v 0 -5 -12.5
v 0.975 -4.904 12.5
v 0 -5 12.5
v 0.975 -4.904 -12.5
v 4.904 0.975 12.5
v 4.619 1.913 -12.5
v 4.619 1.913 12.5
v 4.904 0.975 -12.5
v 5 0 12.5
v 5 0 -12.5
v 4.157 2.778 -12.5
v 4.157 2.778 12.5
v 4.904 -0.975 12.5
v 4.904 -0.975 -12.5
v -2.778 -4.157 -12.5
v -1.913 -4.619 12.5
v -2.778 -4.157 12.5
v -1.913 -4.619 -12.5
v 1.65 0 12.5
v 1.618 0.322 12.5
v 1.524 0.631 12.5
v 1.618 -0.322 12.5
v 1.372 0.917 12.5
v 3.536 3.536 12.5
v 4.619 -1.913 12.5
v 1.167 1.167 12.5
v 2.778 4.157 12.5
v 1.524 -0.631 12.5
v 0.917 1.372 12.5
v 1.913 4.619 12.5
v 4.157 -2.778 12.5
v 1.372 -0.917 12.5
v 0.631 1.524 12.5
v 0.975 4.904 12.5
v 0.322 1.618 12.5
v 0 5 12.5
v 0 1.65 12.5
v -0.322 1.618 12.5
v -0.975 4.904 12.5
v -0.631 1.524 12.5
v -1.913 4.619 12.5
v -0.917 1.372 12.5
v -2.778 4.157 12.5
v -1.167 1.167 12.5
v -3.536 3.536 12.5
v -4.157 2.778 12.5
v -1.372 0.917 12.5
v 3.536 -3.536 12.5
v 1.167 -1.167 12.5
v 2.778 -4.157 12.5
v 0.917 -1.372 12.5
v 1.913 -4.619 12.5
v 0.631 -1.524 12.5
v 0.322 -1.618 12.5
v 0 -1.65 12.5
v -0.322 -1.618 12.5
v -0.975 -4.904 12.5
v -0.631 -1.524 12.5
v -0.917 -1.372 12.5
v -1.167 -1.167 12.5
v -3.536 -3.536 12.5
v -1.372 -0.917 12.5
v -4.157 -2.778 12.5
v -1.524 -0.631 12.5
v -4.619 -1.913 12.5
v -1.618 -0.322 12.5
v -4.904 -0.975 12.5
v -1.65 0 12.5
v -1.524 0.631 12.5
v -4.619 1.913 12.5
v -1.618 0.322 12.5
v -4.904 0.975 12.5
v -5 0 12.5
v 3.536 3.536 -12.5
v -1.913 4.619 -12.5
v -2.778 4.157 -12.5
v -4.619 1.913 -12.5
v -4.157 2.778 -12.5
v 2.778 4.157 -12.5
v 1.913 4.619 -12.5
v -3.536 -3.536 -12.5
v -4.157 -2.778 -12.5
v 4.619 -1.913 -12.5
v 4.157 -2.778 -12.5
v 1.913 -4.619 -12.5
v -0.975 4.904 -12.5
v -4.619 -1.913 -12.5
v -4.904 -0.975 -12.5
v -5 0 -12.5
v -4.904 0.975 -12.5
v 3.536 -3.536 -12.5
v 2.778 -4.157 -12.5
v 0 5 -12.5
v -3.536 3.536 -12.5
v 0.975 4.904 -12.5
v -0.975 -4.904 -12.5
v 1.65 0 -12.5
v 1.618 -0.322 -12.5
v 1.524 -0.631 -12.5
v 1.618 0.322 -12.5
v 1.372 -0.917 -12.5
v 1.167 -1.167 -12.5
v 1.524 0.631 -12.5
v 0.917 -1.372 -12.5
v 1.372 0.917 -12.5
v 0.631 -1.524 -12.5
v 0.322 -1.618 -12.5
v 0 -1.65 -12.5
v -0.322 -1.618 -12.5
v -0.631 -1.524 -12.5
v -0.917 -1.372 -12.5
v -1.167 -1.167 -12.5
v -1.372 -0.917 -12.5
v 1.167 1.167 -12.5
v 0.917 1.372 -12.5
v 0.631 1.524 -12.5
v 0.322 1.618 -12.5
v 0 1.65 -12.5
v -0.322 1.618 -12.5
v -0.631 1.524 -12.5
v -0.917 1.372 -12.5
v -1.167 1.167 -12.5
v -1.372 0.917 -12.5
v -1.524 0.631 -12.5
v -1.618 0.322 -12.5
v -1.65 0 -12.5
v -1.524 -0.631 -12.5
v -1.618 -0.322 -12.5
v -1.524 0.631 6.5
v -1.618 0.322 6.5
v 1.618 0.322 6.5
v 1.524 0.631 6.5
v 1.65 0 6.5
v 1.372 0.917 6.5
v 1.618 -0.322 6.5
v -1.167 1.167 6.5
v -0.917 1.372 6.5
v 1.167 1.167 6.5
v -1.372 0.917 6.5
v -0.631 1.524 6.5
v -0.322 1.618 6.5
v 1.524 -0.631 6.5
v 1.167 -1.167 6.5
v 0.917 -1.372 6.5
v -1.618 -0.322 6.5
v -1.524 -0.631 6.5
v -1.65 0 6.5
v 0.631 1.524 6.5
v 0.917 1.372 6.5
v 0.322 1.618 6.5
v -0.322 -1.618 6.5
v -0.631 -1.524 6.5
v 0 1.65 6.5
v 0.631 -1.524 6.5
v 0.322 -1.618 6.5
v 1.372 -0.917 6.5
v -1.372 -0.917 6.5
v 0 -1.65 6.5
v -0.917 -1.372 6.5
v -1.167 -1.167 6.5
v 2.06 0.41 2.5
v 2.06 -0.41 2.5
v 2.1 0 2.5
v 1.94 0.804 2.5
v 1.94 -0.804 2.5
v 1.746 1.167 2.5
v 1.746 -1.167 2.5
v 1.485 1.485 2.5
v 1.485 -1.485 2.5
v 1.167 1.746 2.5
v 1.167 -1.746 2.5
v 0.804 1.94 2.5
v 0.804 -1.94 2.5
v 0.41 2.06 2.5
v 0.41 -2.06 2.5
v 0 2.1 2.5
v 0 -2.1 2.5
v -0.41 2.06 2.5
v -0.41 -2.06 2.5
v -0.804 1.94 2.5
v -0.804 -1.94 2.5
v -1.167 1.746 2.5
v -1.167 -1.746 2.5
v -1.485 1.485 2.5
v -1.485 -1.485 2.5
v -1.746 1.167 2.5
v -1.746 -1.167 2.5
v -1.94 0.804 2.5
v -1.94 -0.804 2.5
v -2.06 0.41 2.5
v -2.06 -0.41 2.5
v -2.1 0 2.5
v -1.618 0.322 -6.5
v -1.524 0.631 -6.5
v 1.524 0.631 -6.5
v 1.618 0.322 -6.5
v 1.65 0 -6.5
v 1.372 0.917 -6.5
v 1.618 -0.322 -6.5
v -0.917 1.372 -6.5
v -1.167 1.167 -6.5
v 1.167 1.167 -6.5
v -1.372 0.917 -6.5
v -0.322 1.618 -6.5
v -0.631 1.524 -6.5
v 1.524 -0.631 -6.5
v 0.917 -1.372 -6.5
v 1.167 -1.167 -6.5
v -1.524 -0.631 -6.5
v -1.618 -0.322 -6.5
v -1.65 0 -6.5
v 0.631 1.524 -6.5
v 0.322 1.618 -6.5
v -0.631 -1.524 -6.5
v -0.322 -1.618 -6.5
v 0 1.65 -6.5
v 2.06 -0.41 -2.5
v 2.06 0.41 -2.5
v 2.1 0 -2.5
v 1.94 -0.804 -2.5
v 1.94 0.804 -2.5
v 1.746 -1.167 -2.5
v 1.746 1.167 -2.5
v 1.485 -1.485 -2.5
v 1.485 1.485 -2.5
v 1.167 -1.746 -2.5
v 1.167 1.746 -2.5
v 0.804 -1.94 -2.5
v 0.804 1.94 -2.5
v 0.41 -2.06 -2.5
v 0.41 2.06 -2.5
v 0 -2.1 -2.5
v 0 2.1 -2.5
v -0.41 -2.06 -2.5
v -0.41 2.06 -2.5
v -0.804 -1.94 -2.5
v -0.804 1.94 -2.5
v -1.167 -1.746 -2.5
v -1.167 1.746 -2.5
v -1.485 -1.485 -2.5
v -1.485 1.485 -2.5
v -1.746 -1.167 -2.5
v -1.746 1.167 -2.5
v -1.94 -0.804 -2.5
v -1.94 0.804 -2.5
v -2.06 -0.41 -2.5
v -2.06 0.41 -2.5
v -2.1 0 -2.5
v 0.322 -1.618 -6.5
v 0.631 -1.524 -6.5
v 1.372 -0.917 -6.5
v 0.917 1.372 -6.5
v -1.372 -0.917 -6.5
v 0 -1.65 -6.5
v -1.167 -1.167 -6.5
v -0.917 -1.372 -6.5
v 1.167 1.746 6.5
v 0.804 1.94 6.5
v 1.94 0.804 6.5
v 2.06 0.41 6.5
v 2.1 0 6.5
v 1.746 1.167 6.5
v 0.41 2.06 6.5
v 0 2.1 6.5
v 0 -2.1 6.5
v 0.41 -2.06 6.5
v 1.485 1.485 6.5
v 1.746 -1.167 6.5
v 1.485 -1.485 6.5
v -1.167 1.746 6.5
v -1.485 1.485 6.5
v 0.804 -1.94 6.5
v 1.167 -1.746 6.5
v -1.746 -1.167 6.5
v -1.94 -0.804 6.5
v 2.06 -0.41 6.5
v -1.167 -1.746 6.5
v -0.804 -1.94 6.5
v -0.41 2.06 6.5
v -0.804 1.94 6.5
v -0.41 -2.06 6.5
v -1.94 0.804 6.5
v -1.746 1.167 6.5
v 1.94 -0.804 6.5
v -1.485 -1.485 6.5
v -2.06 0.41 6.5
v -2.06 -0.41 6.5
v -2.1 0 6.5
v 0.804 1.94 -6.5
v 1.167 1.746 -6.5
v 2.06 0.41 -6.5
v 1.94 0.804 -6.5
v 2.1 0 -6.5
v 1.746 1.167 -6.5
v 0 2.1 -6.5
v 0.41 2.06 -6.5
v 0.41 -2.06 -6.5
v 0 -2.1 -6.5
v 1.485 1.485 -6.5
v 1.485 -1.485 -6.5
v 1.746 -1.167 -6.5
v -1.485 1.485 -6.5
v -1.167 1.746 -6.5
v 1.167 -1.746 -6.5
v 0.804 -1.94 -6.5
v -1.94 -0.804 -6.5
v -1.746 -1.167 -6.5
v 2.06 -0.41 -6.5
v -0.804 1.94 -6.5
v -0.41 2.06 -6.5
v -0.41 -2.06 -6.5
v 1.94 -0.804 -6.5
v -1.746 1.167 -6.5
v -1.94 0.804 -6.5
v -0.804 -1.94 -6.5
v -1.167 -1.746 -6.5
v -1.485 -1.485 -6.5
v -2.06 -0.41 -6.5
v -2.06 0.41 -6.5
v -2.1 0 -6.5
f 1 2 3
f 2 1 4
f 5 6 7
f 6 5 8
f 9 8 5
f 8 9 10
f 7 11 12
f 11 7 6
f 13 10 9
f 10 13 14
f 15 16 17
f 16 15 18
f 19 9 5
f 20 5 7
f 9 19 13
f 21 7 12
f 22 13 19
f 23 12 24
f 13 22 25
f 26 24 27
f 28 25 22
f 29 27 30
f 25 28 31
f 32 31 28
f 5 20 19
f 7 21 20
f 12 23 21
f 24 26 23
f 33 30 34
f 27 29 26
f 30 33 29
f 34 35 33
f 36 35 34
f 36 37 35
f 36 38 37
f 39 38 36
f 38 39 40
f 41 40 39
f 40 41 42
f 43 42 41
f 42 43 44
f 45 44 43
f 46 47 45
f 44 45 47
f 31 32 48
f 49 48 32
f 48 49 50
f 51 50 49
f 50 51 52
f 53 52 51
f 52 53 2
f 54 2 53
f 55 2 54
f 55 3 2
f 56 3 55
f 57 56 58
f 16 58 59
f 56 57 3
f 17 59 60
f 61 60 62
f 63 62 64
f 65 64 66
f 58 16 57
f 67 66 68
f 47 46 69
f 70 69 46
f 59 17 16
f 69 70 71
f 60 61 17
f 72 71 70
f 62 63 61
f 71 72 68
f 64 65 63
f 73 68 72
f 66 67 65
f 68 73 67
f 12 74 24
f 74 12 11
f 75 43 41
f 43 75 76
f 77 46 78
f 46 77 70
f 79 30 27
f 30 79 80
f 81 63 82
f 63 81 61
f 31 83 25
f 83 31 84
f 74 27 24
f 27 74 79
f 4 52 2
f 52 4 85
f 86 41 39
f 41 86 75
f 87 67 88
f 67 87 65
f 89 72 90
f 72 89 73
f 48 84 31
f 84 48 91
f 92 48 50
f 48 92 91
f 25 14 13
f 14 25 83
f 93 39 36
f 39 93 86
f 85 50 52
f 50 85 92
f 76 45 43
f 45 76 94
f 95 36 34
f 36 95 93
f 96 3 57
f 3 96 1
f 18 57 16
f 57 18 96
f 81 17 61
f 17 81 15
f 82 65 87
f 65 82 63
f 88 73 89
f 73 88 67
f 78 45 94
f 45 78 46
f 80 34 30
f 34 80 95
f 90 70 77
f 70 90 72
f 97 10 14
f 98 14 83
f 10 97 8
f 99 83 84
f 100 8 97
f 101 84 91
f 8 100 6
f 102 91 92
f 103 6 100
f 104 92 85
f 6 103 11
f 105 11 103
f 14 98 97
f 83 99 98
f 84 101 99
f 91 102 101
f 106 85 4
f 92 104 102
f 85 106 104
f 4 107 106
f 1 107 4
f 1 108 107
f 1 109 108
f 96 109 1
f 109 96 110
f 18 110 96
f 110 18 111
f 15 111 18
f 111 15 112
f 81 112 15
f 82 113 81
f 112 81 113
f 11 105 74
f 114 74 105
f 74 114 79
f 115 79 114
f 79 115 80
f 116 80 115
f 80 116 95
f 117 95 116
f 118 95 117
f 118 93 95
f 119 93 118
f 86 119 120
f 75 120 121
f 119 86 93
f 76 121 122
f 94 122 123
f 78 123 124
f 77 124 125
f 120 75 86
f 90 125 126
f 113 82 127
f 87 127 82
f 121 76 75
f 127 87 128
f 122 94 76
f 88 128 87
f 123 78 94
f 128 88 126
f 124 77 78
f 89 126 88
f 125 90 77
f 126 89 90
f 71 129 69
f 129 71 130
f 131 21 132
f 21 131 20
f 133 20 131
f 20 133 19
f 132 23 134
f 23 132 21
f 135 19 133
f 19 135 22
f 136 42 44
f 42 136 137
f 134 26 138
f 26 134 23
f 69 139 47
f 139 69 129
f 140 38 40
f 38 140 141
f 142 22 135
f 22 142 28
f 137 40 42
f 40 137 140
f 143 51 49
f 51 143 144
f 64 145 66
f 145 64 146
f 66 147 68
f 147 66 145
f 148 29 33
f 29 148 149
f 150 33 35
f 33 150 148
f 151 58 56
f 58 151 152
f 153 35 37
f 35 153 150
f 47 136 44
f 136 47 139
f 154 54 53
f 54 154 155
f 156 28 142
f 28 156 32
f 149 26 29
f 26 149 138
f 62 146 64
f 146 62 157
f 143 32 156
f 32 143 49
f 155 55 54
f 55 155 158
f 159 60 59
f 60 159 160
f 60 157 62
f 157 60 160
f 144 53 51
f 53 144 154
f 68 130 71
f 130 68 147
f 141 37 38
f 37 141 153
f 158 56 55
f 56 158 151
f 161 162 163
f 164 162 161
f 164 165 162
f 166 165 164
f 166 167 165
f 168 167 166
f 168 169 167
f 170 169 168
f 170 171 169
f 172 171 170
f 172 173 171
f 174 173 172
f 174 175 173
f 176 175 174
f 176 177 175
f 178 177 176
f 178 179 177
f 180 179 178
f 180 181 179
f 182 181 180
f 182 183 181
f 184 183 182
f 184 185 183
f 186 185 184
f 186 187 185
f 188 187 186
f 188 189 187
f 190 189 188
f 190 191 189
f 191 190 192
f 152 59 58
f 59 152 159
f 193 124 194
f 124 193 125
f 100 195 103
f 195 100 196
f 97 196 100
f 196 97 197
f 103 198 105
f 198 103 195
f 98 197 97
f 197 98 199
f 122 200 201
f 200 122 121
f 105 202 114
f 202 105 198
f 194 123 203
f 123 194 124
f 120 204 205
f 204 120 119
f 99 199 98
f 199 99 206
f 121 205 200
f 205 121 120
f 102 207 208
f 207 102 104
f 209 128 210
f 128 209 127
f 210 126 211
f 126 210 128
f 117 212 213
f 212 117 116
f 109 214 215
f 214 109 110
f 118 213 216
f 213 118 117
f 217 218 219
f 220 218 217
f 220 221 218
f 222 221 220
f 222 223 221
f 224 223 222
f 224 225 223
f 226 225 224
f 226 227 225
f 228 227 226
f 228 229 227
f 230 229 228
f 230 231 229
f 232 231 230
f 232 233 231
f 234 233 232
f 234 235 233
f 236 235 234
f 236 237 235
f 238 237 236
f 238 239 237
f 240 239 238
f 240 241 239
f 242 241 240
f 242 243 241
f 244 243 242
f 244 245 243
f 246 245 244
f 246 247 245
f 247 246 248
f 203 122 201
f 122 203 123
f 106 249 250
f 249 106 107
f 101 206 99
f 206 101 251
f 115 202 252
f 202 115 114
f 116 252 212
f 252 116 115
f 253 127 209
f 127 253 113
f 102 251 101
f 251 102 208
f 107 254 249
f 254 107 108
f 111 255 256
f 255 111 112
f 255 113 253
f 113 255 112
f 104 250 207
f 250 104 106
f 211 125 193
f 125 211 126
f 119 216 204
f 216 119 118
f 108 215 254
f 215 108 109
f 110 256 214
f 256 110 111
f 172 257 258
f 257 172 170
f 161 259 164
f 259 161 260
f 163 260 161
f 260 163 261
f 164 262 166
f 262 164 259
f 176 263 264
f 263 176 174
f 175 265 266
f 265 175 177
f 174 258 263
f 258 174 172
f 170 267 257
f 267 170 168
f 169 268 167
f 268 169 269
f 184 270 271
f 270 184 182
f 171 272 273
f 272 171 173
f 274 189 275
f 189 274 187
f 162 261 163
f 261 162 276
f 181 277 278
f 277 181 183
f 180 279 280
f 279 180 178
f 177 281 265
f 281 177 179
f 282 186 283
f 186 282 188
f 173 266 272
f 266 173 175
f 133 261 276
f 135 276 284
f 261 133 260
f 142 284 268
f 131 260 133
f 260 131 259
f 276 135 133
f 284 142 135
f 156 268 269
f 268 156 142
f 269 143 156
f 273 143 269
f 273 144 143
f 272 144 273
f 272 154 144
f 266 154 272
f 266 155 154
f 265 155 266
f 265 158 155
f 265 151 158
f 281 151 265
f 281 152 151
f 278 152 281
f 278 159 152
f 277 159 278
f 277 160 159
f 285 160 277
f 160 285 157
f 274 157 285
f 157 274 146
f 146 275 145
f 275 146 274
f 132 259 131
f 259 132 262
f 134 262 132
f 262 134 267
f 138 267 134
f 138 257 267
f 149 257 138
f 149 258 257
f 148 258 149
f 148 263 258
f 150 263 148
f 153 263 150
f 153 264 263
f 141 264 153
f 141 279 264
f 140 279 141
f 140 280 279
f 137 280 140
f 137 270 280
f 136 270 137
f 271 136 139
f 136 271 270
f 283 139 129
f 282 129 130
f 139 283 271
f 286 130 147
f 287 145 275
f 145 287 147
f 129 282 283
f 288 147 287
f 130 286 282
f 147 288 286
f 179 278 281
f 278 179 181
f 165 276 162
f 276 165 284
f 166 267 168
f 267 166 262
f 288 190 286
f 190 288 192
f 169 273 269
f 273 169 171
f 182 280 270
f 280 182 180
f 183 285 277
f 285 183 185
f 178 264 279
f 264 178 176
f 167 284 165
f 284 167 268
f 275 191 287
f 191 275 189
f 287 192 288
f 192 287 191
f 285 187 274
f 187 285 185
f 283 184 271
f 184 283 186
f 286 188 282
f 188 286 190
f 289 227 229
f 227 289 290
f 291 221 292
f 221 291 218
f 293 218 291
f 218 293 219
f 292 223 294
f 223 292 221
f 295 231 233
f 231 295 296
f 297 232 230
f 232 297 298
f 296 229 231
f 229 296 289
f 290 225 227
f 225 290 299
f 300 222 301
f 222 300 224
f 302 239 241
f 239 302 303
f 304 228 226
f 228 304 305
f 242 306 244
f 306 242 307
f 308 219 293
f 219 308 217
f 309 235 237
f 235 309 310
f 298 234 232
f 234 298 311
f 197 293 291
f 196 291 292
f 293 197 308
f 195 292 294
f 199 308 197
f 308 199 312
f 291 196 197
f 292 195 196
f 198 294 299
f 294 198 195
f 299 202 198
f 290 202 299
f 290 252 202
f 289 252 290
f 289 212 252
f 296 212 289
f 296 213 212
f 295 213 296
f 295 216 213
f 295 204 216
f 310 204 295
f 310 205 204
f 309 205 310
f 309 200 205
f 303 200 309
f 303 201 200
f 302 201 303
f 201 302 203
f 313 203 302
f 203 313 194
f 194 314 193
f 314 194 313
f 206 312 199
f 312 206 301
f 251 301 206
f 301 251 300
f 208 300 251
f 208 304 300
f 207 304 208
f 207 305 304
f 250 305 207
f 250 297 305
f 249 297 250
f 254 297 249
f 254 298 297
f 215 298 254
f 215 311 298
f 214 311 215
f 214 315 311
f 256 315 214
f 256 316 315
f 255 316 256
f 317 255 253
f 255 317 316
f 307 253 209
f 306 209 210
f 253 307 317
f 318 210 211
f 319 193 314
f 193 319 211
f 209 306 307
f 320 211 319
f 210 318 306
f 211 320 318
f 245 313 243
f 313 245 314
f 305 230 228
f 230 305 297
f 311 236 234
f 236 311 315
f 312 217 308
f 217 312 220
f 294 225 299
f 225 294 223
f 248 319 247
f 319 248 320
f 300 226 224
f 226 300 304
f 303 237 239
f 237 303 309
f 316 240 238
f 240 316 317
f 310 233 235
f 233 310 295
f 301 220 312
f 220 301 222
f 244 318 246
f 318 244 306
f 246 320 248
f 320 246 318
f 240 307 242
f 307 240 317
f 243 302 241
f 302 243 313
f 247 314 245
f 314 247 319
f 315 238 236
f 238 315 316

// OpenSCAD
$fn=32;

module fastener() {
    difference() {
        cylinder(r=5, h=25, center=true);
        translate([0, 0, 7.5]) cylinder(r=1.65, h=10, center=true);
        translate([0, 0, -7.5]) cylinder(r=1.65, h=10, center=true);
        translate([0, 0, 4.5]) cylinder(r=2.1, h=4, center=true);
        translate([0, 0, -4.5]) cylinder(r=2.1, h=4, center=true);
    };
};

fastener();
